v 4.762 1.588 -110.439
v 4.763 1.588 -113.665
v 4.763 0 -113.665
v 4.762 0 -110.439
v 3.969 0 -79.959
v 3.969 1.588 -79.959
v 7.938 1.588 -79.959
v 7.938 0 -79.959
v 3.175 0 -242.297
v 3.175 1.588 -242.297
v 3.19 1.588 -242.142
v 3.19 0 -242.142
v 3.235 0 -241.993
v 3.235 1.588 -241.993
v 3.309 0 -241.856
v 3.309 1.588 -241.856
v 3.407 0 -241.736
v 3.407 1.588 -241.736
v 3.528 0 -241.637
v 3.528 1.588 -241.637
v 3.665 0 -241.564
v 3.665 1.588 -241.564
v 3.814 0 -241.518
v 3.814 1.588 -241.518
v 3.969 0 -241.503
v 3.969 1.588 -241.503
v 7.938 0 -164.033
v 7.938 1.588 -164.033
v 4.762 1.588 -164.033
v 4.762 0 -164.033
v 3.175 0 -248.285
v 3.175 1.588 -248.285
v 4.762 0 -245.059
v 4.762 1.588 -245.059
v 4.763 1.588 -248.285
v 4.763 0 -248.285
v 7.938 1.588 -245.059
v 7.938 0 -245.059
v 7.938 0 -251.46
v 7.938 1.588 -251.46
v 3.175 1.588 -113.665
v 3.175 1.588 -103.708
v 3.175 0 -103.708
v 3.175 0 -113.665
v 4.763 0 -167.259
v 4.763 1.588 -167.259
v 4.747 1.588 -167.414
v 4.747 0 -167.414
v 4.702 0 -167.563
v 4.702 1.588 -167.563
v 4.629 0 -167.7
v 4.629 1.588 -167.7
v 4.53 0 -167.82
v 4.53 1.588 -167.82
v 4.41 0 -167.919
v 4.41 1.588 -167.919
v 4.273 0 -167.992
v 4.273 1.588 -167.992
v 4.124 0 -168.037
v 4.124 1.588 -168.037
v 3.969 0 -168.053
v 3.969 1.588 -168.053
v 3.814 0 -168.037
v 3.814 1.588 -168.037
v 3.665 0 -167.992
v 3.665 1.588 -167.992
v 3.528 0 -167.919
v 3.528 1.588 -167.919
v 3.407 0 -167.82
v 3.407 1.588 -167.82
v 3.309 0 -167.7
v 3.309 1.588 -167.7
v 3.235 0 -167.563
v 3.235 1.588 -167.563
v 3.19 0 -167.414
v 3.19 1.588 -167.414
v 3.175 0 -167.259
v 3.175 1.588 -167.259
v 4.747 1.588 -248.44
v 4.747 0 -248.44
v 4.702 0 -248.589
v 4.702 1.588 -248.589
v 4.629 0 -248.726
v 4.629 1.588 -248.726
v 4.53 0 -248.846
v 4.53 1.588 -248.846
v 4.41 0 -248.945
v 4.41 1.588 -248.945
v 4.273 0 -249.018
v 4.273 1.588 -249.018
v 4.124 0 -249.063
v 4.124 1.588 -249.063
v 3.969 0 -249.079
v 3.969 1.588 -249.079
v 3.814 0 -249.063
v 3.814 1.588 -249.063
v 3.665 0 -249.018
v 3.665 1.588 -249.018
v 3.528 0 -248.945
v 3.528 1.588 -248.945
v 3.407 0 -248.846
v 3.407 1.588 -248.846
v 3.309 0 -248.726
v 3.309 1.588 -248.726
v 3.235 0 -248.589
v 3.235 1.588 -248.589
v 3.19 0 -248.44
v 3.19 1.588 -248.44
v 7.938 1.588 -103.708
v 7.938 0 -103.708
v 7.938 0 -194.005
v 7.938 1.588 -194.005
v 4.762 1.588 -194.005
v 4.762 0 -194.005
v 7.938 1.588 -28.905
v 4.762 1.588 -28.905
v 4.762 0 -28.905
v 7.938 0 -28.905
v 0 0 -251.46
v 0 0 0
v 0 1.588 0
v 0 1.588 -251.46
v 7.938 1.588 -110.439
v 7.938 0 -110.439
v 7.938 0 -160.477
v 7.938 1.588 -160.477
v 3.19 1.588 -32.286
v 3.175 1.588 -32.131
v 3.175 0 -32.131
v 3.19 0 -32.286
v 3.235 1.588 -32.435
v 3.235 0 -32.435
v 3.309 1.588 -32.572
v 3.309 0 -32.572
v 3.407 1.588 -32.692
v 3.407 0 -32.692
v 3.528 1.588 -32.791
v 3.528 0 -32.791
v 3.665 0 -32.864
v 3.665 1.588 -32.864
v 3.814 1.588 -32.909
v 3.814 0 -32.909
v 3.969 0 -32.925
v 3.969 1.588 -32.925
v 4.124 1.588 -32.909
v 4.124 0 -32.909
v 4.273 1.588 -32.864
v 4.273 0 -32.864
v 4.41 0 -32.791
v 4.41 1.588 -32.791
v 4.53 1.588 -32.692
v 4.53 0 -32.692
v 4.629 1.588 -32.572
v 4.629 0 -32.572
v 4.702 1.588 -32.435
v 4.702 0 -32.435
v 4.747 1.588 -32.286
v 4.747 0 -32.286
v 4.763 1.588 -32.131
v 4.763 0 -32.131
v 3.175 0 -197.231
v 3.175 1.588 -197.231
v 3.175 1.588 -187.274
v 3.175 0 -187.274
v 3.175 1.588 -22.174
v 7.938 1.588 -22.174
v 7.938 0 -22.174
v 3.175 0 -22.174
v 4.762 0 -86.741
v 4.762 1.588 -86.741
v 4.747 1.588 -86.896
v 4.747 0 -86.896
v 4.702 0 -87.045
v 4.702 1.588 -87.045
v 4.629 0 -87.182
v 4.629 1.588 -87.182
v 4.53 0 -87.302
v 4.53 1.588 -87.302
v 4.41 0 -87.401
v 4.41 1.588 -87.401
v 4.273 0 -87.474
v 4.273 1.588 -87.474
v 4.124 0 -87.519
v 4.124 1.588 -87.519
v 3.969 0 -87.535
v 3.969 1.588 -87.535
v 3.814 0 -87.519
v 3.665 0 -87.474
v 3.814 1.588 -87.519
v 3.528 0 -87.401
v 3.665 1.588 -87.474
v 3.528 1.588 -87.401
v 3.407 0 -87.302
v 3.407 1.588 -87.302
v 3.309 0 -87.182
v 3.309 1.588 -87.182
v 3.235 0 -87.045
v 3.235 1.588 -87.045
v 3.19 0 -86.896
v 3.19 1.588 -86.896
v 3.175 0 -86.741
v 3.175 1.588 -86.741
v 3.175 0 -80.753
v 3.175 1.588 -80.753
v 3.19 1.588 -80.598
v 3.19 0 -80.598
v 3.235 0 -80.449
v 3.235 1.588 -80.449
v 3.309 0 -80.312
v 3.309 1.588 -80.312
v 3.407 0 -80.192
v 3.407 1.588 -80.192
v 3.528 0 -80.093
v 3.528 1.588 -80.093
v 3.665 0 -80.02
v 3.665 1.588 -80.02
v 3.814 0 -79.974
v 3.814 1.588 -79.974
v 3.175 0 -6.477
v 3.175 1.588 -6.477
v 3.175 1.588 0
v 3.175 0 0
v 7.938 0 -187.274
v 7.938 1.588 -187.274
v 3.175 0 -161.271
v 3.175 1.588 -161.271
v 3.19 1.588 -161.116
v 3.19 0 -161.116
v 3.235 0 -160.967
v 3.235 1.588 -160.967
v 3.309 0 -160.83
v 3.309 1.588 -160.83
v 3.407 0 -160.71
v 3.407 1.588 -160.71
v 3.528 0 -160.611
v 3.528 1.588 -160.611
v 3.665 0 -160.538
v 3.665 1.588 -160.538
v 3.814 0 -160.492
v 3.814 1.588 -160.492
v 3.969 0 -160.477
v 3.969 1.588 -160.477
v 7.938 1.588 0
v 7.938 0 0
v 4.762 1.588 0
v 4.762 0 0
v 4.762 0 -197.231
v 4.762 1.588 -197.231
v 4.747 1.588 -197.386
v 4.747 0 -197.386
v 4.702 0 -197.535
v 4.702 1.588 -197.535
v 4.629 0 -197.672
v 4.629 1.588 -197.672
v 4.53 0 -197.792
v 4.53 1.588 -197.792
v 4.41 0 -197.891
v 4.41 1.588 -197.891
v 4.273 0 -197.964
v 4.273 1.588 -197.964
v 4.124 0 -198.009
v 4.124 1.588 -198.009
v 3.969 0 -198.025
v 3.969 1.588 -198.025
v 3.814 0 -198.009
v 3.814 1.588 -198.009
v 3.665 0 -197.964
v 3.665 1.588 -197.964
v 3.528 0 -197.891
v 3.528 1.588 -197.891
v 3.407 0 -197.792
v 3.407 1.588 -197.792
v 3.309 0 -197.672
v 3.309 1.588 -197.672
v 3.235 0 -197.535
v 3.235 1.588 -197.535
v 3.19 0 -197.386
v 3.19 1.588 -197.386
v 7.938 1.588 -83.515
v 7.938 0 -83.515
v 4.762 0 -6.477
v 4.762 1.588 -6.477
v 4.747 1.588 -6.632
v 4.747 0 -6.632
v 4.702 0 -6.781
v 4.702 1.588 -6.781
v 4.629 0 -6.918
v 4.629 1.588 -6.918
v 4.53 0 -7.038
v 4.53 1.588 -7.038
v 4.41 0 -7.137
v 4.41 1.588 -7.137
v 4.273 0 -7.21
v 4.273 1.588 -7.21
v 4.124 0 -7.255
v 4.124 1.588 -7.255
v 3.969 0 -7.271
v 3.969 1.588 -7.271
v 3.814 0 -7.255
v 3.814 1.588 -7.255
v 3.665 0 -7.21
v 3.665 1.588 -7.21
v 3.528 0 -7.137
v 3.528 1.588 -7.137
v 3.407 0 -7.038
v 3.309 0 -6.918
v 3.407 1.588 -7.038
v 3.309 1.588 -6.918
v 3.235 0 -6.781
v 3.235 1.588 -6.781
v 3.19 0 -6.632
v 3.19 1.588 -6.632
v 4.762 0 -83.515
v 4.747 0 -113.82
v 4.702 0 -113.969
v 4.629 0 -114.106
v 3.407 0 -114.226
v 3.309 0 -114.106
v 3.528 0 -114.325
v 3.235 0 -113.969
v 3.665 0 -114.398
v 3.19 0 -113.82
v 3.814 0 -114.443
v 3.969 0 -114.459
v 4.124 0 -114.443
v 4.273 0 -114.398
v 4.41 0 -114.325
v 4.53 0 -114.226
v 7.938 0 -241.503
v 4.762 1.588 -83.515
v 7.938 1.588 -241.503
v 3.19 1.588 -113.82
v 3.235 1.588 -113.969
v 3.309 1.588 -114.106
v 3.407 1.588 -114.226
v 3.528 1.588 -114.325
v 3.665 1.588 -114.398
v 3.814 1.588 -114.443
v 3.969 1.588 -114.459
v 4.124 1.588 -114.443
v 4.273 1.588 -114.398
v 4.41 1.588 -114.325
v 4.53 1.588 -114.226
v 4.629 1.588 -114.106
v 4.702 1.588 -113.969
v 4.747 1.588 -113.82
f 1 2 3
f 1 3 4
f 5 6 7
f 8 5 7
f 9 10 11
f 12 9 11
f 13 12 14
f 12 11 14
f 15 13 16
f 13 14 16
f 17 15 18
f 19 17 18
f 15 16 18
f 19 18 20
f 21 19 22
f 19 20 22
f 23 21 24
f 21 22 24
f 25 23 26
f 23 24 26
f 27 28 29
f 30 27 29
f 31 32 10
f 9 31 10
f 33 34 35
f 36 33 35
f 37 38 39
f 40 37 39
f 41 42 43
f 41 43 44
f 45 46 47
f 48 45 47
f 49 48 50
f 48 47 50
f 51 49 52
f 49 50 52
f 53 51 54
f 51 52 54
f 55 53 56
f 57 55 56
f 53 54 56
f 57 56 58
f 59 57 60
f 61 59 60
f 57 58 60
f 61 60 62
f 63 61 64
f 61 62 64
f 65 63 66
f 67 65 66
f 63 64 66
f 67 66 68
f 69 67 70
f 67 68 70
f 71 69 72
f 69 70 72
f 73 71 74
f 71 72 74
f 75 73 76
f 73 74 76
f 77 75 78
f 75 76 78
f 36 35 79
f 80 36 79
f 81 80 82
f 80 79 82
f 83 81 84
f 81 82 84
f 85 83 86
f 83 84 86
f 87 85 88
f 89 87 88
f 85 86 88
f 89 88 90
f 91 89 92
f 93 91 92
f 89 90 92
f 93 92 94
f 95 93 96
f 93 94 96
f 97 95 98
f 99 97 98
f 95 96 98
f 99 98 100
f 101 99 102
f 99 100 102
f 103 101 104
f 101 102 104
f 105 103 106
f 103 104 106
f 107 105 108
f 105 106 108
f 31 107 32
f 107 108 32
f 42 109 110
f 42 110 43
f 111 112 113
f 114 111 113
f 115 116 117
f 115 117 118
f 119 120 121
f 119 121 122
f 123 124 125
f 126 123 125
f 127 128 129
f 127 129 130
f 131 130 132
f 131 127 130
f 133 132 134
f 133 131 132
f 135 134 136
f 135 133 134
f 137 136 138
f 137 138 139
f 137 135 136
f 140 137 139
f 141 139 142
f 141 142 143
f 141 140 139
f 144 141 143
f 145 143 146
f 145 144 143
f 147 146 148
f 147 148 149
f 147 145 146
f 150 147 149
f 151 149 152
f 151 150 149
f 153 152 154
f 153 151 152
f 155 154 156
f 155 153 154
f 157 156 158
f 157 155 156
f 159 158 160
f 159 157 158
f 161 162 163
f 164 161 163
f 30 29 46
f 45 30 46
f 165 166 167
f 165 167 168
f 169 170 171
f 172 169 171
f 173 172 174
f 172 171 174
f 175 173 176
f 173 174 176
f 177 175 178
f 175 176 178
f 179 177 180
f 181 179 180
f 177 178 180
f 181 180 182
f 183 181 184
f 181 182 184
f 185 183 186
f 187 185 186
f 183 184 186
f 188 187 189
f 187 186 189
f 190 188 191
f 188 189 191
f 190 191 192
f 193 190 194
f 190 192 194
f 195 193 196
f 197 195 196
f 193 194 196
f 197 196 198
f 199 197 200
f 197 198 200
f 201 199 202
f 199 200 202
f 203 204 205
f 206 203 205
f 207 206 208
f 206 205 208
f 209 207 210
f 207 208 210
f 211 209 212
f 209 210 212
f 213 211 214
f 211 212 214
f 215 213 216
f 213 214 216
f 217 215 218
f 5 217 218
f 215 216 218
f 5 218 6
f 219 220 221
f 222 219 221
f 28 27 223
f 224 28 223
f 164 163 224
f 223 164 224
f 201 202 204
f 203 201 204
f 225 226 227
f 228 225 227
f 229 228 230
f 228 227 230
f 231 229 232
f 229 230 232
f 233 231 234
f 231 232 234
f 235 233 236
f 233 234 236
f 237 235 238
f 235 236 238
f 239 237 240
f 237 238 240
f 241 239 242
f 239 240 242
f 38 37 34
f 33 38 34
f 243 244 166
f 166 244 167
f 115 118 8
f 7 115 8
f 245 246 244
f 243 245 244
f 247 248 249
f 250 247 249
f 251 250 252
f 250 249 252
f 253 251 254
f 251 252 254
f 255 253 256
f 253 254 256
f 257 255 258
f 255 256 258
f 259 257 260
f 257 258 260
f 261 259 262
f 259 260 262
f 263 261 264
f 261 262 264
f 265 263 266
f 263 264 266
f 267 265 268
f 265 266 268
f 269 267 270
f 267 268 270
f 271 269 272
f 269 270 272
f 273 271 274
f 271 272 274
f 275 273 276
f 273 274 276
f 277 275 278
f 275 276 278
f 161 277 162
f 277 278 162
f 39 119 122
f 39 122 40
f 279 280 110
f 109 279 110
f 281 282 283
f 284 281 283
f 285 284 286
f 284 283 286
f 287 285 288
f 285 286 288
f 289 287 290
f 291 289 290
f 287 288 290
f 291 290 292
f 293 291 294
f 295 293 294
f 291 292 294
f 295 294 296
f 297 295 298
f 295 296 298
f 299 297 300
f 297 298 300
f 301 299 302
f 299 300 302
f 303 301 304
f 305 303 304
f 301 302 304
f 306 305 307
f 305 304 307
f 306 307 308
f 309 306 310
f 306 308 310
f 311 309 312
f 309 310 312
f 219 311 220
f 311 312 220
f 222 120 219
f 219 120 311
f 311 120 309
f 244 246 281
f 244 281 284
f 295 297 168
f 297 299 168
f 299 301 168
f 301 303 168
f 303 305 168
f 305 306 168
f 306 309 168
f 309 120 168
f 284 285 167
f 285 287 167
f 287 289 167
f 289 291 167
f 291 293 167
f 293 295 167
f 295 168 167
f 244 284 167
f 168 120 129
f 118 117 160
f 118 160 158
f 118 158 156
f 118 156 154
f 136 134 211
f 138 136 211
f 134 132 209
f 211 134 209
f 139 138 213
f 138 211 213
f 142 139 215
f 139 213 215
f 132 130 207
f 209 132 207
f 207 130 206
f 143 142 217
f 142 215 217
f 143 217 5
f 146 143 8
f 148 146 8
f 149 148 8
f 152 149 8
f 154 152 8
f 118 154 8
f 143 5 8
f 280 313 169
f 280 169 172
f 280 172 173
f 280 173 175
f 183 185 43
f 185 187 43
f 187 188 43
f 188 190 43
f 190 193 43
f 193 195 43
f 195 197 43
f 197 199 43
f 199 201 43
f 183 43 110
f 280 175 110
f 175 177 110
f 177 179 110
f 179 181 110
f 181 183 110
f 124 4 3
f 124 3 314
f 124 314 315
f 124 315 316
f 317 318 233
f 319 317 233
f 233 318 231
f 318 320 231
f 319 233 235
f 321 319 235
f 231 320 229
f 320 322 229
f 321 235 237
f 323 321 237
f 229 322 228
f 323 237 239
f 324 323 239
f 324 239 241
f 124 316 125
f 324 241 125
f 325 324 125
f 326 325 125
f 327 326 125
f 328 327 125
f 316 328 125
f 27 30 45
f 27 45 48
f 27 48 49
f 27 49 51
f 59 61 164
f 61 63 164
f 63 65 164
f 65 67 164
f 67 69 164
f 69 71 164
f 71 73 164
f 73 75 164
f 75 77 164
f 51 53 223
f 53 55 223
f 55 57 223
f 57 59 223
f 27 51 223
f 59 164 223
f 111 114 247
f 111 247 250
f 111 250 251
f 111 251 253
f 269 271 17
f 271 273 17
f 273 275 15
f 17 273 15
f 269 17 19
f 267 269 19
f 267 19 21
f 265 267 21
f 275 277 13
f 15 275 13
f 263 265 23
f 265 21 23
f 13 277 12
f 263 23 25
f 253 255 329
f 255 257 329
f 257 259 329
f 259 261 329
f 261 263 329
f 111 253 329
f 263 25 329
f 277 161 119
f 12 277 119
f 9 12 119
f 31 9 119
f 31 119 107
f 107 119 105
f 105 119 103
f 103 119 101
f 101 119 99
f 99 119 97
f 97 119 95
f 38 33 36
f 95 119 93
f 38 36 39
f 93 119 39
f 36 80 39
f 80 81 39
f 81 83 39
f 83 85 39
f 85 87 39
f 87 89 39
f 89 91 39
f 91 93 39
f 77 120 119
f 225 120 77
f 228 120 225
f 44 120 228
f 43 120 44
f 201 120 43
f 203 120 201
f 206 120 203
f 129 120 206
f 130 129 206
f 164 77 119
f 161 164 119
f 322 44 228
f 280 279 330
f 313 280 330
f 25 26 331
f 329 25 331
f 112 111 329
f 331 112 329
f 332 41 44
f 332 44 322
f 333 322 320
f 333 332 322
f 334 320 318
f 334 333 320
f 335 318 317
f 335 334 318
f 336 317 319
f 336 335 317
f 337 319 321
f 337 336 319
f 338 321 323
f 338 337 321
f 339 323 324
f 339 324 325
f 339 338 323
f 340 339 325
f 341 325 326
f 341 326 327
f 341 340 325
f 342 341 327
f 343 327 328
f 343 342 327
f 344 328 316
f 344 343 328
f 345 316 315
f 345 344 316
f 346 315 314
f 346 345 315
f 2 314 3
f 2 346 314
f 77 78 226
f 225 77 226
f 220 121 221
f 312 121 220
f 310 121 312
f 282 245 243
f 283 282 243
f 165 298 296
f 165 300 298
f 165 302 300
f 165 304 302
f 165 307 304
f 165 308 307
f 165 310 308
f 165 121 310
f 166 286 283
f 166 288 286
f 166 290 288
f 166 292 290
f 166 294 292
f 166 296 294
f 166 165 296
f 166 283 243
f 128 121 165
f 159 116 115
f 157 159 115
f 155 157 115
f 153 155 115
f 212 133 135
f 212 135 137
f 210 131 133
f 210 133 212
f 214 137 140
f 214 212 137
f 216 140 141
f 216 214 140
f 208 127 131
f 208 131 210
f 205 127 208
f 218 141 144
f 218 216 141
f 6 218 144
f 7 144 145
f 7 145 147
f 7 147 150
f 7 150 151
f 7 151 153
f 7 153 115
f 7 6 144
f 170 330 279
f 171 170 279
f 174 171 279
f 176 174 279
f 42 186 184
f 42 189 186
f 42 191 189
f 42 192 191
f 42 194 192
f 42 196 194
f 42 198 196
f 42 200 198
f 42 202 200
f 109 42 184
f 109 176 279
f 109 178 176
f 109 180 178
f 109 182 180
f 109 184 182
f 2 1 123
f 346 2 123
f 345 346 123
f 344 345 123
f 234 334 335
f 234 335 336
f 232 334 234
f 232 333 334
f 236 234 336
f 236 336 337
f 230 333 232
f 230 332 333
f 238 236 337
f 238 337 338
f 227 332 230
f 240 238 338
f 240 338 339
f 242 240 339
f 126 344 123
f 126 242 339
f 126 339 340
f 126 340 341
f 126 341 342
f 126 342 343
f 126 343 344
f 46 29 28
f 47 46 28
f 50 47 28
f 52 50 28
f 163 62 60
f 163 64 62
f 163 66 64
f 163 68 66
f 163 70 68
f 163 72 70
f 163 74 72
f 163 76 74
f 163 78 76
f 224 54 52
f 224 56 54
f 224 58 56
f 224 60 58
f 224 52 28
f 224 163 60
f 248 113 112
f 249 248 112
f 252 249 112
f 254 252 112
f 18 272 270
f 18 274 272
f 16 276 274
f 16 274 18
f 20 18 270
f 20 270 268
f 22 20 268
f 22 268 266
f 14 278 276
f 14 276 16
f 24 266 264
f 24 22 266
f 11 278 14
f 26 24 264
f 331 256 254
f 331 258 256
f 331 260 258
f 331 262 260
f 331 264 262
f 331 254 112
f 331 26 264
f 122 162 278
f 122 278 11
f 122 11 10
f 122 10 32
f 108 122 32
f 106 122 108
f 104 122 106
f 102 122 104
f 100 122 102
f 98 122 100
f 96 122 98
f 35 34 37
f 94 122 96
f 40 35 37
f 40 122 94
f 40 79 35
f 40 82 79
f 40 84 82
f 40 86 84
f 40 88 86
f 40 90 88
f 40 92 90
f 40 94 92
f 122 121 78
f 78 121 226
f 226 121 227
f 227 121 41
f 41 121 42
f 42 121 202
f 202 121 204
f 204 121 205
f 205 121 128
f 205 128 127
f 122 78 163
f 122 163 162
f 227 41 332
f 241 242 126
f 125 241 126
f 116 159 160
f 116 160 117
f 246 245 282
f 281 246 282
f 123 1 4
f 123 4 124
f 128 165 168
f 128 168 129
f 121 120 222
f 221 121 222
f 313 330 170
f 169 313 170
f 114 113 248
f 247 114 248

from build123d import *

# Parameters (mm, degrees)
SKETCH1_W           = 7.9375
SKETCH1_H           = 251.46
BOSS_EXTRUDE1_DEPTH = 1.5875
CUT_EXTRUDE1_DEPTH  = 1.5875


with BuildPart() as part:
    # Sketch1 → Boss-Extrude1 (new body)
    with BuildSketch(Plane(origin=(0, 0, 0), x_dir=(1, 0, 0), z_dir=(0, 1, 0))):
        with Locations((3.96875, 125.73)):
            Rectangle(SKETCH1_W, SKETCH1_H)
    extrude(amount=BOSS_EXTRUDE1_DEPTH)

    # Sketch2 → Cut-Extrude1 (cut)
    with BuildSketch(Plane(origin=(0, 1.5875, 0), x_dir=(1, 0, 0), z_dir=(0, 1, 0))):
        with BuildLine():
            Line((7.9375, 245.0592), (4.7625, 245.0592))
            Line((4.7625, 245.0592), (4.7625, 248.285))
            ThreePointArc((4.7625, 248.285), (3.96875, 249.07875), (3.175, 248.285))
            Line((3.175, 248.285), (3.175, 242.29695))
            ThreePointArc((3.175, 242.29695), (3.407483992, 241.735683992), (3.96875, 241.5032))
            Line((3.96875, 241.5032), (7.9375, 241.5032))
            Line((7.9375, 241.5032), (7.9375, 245.0592))
        make_face()
        with BuildLine():
            Line((7.9375, 194.0052), (4.7625, 194.0052))
            Line((4.7625, 194.0052), (4.7625, 197.231))
            ThreePointArc((4.7625, 197.231), (3.96875, 198.02475), (3.175, 197.231))
            Line((3.175, 197.231), (3.175, 191.24295))
            Line((3.175, 191.24295), (3.175, 187.2742))
            Line((3.175, 187.2742), (7.9375, 187.2742))
            Line((7.9375, 187.2742), (7.9375, 190.4492))
            Line((7.9375, 190.4492), (7.9375, 194.0052))
        make_face()
        with BuildLine():
            Line((7.9375, 103.7082), (3.175, 103.7082))
            Line((3.175, 103.7082), (3.175, 107.67695))
            Line((3.175, 107.67695), (3.175, 113.665))
            ThreePointArc((3.175, 113.665), (3.96875, 114.45875), (4.7625, 113.665))
            Line((4.7625, 113.665), (4.7625, 110.4392))
            Line((4.7625, 110.4392), (7.9375, 110.4392))
            Line((7.9375, 110.4392), (7.9375, 106.8832))
            Line((7.9375, 106.8832), (7.9375, 103.7082))
        make_face()
        with BuildLine():
            Line((7.9375, 160.4772), (7.9375, 164.0332))
            Line((7.9375, 164.0332), (4.7625, 164.0332))
            Line((4.7625, 164.0332), (4.7625, 167.259))
            ThreePointArc((4.7625, 167.259), (3.96875, 168.05275), (3.175, 167.259))
            Line((3.175, 167.259), (3.175, 161.27095))
            ThreePointArc((3.175, 161.27095), (3.407483992, 160.709683992), (3.96875, 160.4772))
            Line((3.96875, 160.4772), (7.9375, 160.4772))
        make_face()
        with BuildLine():
            Line((7.9375, 22.1742), (3.175, 22.1742))
            Line((3.175, 22.1742), (3.175, 26.14295))
            Line((3.175, 26.14295), (3.175, 32.131))
            ThreePointArc((3.175, 32.131), (3.96875, 32.92475), (4.7625, 32.131))
            Line((4.7625, 32.131), (4.7625, 28.9052))
            Line((4.7625, 28.9052), (7.9375, 28.9052))
            Line((7.9375, 28.9052), (7.9375, 25.3492))
            Line((7.9375, 25.3492), (7.9375, 22.1742))
        make_face()
        with BuildLine():
            Line((7.9375, 83.5152), (4.7625, 83.5152))
            Line((4.7625, 83.5152), (4.7625, 86.741))
            ThreePointArc((4.7625, 86.741), (3.96875, 87.53475), (3.175, 86.741))
            Line((3.175, 86.741), (3.175, 80.75295))
            ThreePointArc((3.175, 80.75295), (3.407483992, 80.191683992), (3.96875, 79.9592))
            Line((3.96875, 79.9592), (7.9375, 79.9592))
            Line((7.9375, 79.9592), (7.9375, 83.5152))
        make_face()
        with BuildLine():
            Line((3.175, 6.477), (3.175, -0.907374529))
            Line((3.175, -0.907374529), (4.7625, -0.907374529))
            Line((4.7625, -0.907374529), (4.7625, 6.477))
            ThreePointArc((4.7625, 6.477), (3.96875, 7.27075), (3.175, 6.477))
        make_face()
    extrude(amount=-CUT_EXTRUDE1_DEPTH, mode=Mode.SUBTRACT)


solid = part.part
